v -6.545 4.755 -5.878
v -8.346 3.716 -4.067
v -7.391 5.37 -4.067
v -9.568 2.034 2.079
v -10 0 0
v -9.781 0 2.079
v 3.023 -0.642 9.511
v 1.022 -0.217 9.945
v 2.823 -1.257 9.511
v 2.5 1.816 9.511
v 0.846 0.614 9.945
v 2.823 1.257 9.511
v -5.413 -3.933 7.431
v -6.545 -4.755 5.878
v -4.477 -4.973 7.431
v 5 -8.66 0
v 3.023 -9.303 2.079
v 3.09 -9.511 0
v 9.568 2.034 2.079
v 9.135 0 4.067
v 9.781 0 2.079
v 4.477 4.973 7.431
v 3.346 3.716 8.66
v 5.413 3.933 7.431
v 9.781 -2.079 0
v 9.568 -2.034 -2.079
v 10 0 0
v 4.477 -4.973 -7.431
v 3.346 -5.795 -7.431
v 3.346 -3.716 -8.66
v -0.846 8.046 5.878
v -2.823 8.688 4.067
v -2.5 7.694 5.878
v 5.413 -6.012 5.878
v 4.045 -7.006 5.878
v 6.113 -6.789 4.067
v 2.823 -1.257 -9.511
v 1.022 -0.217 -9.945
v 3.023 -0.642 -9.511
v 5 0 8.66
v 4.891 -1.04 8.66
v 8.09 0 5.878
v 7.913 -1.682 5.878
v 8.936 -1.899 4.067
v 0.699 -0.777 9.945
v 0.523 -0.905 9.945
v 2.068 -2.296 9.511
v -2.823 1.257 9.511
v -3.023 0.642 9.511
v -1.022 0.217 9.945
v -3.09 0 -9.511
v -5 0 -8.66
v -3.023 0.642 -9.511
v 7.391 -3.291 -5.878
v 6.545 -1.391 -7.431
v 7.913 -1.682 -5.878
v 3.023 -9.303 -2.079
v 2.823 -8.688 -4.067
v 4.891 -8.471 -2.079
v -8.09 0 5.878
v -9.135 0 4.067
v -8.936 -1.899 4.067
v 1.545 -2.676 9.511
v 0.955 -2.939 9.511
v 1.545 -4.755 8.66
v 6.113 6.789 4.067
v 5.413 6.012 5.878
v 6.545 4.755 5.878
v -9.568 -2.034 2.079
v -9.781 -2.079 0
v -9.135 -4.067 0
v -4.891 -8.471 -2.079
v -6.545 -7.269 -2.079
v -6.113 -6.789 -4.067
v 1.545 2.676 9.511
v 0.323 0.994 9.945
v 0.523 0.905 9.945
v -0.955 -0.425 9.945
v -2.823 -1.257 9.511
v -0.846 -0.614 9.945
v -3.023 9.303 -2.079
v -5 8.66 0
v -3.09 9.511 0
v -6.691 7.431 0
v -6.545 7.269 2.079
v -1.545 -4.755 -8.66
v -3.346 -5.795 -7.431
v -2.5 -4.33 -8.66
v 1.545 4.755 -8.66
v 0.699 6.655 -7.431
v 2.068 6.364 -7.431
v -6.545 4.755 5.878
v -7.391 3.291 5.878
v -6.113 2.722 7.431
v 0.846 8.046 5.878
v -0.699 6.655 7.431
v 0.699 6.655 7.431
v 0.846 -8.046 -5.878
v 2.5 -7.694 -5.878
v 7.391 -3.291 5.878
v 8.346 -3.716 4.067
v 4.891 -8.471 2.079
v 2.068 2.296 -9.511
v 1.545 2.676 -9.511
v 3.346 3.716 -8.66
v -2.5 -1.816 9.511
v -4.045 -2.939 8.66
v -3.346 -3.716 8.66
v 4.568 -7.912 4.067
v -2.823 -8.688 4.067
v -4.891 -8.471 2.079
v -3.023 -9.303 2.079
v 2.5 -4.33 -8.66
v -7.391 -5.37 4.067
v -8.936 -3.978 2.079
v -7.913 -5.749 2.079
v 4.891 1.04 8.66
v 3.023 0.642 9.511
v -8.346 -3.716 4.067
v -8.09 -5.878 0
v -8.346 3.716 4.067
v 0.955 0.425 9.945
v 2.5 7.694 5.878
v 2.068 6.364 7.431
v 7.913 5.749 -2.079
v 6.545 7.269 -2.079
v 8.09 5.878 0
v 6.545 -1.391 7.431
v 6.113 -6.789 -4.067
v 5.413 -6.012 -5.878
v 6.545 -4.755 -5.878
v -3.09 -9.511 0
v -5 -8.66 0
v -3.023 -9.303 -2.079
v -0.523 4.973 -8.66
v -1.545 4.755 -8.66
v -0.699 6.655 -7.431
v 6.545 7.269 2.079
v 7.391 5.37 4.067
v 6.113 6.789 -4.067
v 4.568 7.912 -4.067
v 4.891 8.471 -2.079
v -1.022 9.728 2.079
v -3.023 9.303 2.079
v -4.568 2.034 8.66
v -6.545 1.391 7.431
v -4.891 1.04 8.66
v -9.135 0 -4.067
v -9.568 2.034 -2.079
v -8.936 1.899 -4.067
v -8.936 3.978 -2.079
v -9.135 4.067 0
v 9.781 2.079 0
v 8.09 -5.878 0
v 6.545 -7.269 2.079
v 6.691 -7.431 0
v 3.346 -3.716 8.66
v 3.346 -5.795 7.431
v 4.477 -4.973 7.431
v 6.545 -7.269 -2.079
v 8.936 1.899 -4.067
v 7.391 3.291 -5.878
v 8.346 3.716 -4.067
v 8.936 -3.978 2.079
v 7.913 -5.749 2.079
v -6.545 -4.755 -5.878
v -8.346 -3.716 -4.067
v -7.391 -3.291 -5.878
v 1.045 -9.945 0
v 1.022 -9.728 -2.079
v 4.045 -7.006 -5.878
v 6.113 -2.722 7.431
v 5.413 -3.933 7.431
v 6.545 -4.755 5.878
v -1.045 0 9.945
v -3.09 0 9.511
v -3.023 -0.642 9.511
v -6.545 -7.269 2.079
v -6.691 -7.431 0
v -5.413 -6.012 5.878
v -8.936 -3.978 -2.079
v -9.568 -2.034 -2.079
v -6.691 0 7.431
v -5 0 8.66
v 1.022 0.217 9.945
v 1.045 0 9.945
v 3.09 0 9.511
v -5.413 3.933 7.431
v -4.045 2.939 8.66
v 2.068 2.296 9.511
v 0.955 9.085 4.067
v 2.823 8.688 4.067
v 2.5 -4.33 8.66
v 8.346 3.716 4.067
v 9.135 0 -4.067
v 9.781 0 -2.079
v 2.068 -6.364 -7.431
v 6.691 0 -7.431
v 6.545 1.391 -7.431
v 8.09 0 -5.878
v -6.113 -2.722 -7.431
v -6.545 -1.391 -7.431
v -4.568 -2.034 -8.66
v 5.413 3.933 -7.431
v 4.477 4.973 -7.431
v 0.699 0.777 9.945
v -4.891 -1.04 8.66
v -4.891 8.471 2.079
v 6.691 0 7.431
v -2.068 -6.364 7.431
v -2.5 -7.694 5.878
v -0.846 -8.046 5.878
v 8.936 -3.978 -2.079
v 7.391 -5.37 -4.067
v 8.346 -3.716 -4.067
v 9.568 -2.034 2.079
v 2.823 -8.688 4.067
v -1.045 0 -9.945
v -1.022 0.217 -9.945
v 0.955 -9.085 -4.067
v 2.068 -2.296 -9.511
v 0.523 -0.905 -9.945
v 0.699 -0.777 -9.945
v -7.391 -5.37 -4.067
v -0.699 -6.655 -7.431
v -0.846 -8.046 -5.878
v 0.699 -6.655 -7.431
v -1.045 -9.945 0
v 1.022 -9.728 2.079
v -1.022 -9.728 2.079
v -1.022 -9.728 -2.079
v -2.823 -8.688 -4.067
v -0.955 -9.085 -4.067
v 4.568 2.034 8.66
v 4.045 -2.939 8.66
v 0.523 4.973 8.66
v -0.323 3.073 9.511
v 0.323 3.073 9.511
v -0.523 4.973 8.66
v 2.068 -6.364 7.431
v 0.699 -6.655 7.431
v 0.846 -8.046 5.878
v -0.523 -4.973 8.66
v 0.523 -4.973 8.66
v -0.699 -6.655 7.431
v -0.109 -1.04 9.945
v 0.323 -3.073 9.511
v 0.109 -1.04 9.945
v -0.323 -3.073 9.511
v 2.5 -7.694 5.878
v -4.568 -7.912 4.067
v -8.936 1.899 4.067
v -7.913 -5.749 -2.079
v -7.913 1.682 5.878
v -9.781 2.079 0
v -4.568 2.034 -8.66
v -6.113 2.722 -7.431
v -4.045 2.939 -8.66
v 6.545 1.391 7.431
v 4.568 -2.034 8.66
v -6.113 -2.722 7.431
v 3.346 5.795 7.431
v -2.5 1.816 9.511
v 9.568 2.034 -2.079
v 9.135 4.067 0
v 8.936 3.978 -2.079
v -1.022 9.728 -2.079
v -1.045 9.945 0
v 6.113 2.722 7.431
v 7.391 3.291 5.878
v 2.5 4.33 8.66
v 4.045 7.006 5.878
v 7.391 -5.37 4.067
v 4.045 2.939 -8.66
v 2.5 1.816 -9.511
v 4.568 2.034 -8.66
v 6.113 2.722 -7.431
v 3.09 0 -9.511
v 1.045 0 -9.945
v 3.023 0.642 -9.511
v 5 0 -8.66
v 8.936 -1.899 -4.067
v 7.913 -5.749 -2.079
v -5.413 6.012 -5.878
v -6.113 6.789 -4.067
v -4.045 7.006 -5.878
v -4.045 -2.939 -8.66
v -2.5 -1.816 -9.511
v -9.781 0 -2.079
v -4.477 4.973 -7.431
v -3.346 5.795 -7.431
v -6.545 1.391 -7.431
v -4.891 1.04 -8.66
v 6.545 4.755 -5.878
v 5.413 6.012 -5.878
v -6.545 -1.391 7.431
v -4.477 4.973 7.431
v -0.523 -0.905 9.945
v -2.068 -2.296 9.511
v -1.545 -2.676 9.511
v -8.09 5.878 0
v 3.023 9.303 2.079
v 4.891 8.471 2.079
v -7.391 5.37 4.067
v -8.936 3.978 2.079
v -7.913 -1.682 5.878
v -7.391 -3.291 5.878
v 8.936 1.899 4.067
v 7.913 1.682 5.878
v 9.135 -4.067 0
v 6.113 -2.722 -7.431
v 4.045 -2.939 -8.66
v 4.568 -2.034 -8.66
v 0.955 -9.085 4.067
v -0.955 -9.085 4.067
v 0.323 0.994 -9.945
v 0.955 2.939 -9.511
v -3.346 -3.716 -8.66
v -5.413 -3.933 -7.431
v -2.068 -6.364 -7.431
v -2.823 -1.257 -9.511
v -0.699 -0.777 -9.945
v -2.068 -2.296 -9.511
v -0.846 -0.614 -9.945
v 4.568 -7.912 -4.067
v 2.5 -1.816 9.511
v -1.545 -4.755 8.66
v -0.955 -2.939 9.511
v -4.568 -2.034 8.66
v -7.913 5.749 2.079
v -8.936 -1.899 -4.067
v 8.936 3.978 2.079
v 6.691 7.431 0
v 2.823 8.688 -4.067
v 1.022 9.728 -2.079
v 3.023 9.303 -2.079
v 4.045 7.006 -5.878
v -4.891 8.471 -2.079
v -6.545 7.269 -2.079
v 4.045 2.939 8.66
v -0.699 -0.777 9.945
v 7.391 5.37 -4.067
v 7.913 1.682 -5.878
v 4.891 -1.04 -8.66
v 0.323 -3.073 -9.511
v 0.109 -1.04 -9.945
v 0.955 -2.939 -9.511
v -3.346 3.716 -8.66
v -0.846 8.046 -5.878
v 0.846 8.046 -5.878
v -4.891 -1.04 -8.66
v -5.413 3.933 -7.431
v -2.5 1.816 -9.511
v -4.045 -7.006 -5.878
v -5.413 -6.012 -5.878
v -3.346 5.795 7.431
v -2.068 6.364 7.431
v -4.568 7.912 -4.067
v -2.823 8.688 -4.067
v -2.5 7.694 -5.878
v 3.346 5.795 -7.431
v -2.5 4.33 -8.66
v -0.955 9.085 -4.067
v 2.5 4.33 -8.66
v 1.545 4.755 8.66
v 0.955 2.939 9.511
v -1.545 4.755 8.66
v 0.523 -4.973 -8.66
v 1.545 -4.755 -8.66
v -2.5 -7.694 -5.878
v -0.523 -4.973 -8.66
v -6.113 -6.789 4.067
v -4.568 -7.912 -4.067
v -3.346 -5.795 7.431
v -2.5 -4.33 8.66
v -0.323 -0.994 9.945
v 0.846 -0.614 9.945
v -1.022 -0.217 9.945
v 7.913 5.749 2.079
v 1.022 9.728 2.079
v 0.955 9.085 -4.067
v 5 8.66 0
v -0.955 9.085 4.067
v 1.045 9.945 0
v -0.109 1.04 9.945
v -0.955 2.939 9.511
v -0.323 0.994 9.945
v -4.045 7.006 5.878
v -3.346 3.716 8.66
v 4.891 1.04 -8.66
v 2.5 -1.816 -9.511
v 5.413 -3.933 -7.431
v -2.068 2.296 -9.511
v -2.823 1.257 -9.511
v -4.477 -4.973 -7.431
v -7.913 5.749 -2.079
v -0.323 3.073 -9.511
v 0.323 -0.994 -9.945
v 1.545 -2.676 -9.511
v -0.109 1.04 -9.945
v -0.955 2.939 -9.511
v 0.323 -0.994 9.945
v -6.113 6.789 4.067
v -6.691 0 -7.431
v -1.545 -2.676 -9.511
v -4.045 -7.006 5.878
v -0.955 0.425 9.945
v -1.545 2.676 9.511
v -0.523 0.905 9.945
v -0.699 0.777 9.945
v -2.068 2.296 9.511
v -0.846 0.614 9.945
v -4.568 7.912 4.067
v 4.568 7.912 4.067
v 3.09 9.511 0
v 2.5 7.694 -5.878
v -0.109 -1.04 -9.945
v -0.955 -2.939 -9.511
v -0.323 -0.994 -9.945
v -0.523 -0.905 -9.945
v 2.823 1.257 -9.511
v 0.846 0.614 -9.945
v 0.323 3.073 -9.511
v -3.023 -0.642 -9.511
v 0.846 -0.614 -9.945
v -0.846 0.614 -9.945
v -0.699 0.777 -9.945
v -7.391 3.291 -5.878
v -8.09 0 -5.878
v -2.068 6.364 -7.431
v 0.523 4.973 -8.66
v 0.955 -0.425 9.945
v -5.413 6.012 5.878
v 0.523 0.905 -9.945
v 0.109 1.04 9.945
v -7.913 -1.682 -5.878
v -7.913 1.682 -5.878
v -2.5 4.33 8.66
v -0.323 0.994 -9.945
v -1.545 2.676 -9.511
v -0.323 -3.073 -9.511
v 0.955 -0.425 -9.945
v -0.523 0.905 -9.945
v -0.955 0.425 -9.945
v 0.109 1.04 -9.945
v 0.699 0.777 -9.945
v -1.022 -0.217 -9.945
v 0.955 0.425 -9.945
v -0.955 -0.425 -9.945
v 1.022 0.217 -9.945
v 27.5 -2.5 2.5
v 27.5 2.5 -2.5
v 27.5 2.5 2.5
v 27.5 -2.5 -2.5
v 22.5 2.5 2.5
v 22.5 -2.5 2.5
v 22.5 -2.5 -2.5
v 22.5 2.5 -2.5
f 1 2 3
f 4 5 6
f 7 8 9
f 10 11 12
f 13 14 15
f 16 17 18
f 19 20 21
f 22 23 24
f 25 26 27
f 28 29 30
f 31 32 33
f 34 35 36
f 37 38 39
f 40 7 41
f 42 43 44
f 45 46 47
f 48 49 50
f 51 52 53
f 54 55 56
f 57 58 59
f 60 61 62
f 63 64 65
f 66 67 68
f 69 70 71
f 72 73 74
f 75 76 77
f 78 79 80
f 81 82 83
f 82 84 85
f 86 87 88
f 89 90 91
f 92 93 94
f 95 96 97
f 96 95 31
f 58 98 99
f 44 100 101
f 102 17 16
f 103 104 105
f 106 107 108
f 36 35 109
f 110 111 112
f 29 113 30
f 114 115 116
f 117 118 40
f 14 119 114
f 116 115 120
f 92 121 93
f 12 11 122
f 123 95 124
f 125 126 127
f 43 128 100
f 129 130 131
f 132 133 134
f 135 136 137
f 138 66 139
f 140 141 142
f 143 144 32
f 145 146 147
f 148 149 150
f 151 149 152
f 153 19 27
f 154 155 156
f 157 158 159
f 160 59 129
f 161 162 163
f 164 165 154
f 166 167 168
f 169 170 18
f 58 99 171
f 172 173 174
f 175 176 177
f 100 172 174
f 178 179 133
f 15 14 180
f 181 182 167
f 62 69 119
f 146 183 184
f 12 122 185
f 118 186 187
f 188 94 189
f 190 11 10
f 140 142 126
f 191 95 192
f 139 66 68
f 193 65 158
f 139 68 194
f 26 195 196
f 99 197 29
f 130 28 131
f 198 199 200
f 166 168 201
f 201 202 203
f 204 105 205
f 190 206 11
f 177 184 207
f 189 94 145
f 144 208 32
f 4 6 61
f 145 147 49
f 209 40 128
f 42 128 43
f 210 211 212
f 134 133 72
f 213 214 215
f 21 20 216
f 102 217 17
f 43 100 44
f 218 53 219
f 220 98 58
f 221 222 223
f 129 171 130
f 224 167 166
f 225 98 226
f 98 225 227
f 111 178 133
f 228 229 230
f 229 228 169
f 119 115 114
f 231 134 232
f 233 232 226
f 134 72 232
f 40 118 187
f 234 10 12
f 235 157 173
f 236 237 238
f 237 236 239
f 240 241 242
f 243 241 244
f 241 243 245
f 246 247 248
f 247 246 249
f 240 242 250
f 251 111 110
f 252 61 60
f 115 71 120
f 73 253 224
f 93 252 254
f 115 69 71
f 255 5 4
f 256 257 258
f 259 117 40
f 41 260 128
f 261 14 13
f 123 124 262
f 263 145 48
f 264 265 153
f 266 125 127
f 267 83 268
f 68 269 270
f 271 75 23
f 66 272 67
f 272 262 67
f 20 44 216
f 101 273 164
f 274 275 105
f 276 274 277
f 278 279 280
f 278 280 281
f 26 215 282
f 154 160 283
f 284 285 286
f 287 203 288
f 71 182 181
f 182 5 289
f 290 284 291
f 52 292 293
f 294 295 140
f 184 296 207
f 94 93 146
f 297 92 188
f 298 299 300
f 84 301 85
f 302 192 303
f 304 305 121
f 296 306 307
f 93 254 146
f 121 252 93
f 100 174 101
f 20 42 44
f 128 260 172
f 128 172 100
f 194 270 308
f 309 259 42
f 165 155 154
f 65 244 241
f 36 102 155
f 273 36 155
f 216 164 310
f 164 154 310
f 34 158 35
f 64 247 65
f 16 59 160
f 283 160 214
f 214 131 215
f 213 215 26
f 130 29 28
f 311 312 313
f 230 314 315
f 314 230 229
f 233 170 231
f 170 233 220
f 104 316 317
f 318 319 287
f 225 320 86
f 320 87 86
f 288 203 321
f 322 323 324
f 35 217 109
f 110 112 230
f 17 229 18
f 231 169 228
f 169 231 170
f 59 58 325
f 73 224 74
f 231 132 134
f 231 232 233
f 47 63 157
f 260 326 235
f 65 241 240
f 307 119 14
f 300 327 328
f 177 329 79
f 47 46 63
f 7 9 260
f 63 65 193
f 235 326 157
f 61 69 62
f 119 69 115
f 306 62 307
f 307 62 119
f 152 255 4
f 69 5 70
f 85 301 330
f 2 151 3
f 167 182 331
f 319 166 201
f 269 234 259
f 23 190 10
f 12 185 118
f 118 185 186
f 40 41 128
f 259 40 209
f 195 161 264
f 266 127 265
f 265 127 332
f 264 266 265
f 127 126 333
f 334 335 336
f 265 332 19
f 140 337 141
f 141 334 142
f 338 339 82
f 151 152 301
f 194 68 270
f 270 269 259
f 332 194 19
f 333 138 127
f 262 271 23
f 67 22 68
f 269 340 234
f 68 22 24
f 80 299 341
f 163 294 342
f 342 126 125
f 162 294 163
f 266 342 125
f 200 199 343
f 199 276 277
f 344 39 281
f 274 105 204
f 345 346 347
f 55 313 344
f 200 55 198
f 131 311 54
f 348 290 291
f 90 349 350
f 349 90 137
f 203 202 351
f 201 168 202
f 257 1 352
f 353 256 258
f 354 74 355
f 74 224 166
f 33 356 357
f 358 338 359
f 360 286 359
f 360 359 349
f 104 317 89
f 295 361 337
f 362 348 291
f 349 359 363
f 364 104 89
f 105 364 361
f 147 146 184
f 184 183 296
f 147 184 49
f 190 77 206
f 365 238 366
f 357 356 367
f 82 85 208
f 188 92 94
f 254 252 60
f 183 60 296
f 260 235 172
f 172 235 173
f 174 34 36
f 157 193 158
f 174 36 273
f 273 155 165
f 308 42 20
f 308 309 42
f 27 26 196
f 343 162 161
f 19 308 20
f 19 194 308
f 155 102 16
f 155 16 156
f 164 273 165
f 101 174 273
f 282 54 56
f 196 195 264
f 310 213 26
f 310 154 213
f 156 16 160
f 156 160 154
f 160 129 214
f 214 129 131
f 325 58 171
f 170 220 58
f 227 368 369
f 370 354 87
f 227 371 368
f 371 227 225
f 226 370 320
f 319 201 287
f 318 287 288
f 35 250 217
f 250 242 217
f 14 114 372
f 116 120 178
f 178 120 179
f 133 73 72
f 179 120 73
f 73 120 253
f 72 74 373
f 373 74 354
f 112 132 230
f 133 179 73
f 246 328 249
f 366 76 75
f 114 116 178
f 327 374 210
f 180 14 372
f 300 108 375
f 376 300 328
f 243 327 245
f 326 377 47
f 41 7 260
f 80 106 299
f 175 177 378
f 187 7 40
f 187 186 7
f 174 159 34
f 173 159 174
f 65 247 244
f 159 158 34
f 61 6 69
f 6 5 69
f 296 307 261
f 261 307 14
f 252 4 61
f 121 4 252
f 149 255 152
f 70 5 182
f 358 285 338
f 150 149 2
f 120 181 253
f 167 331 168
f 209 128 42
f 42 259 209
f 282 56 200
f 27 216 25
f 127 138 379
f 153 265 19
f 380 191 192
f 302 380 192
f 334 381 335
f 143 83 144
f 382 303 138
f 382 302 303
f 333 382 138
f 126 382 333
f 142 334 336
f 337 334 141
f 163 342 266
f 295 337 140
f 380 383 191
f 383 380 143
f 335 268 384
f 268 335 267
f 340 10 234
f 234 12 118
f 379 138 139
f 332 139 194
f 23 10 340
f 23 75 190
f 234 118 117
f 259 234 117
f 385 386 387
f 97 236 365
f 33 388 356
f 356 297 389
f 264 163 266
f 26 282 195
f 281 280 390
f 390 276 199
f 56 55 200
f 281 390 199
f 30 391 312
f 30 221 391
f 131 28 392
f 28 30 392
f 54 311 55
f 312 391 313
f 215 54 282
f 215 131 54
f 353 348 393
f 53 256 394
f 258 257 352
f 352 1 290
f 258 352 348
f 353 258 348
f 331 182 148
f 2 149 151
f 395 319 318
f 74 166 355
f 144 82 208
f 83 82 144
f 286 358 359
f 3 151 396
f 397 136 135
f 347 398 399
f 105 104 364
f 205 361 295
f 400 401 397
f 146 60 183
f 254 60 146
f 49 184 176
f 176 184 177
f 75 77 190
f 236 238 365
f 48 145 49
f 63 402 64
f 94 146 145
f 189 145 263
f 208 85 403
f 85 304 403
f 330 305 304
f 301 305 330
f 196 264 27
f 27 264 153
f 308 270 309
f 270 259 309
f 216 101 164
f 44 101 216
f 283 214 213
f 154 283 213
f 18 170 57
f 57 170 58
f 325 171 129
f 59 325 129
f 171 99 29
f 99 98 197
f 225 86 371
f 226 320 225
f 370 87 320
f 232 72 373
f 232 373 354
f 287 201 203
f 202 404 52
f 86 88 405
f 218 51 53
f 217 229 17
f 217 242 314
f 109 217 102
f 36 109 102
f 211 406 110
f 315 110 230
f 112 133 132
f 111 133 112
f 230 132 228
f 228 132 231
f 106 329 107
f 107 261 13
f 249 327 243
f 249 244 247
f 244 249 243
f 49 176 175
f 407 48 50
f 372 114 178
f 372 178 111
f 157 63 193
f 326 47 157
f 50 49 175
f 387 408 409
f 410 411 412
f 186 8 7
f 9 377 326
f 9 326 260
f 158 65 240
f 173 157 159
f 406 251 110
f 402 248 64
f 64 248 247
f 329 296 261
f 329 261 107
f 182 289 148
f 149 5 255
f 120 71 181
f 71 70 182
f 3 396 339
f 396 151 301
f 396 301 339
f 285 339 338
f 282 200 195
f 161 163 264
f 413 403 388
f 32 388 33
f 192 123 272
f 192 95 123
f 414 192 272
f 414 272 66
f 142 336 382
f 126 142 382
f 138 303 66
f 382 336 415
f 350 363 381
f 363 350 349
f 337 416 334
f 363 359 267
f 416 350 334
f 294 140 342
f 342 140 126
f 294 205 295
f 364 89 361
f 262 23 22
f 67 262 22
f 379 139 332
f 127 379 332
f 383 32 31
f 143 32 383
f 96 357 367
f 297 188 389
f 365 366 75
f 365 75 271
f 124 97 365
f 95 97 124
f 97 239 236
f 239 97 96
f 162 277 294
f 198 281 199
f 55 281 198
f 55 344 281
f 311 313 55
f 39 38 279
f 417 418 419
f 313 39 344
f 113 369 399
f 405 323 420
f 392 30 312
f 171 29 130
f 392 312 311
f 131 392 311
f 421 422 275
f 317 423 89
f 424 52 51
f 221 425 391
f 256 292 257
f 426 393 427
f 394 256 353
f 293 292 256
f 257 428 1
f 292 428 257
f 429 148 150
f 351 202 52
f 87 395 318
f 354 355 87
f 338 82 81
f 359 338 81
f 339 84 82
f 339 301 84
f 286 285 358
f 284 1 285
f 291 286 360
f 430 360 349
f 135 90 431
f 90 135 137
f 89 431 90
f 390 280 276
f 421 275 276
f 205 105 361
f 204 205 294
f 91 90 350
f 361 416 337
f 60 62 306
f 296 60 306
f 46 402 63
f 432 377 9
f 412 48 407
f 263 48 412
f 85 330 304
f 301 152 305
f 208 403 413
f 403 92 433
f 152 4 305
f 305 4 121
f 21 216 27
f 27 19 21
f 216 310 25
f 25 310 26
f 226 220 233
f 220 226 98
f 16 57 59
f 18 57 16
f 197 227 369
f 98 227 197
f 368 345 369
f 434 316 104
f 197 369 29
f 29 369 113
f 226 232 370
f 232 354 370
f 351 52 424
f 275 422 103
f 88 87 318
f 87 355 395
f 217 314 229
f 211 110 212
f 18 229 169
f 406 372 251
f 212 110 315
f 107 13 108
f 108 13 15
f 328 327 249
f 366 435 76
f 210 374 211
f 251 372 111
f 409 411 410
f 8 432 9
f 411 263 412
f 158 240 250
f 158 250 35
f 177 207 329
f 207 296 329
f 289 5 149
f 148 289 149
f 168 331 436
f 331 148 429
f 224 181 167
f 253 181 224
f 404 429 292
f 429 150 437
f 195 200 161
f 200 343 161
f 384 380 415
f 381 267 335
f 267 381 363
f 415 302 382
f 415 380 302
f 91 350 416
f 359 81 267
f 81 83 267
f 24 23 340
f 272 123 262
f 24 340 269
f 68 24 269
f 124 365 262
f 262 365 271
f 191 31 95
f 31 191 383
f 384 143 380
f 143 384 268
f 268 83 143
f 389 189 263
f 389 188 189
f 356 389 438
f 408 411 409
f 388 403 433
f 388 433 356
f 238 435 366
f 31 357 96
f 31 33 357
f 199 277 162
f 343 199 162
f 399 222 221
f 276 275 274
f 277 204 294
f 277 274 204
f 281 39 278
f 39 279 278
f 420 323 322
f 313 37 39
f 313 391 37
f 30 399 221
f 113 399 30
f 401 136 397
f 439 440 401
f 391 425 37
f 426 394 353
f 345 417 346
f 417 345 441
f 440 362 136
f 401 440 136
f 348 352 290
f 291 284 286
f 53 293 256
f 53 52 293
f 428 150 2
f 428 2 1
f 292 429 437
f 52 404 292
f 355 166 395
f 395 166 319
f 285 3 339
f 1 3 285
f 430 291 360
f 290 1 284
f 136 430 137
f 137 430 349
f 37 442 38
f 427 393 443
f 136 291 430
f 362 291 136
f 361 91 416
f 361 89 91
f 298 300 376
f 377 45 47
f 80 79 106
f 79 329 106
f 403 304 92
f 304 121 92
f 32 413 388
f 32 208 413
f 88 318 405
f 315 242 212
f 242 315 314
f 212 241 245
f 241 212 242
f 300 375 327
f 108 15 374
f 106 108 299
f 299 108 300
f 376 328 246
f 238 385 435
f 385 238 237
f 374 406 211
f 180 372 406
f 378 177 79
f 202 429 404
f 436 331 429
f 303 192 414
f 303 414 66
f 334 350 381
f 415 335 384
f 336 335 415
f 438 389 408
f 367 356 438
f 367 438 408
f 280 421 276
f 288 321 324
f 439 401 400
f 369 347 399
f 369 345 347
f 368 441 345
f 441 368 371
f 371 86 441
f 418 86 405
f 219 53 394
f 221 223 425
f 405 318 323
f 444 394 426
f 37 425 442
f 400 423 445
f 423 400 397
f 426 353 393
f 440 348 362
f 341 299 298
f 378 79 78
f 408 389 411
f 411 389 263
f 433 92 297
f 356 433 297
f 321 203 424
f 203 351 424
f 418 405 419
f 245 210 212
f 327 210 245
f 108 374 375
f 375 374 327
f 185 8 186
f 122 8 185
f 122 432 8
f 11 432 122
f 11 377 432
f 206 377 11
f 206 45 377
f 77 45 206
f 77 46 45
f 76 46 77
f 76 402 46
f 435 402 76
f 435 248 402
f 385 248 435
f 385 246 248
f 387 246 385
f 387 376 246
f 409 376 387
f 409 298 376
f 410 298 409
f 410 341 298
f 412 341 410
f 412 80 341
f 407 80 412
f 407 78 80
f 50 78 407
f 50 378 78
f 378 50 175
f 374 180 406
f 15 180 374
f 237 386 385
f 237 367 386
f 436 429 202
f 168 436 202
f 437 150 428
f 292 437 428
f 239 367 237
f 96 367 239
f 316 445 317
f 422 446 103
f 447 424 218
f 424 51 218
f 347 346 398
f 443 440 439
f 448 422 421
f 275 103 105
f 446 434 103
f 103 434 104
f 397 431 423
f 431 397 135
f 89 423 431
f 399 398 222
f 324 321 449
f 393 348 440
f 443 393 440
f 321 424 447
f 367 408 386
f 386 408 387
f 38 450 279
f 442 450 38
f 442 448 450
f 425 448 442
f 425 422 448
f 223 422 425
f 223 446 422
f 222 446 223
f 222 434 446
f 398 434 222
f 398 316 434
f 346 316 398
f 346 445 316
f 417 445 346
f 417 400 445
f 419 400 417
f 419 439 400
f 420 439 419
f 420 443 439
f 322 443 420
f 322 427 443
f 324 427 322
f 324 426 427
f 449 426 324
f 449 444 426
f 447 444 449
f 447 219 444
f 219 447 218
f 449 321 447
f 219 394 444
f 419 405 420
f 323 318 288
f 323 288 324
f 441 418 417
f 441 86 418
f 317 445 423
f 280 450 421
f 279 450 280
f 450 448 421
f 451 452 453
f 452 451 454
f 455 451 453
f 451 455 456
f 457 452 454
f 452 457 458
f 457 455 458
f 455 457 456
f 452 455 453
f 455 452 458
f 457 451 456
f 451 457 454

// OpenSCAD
difference() {
  sphere(r=10);
  %cylinder(h=30, r=6, center=true);
}
%if (true) cube([25,6,3], center=true);

%translate([0,-9,0]) difference() {
  color("green") cube([10,4,10], center=true);
  color("red") translate([0,-2,0]) sphere(3);
}

// Test modifiers work with minkowski children
translate([25,0,0]) minkowski() {
      %cube(10, center=true);
      cube(5, center=true);
}
